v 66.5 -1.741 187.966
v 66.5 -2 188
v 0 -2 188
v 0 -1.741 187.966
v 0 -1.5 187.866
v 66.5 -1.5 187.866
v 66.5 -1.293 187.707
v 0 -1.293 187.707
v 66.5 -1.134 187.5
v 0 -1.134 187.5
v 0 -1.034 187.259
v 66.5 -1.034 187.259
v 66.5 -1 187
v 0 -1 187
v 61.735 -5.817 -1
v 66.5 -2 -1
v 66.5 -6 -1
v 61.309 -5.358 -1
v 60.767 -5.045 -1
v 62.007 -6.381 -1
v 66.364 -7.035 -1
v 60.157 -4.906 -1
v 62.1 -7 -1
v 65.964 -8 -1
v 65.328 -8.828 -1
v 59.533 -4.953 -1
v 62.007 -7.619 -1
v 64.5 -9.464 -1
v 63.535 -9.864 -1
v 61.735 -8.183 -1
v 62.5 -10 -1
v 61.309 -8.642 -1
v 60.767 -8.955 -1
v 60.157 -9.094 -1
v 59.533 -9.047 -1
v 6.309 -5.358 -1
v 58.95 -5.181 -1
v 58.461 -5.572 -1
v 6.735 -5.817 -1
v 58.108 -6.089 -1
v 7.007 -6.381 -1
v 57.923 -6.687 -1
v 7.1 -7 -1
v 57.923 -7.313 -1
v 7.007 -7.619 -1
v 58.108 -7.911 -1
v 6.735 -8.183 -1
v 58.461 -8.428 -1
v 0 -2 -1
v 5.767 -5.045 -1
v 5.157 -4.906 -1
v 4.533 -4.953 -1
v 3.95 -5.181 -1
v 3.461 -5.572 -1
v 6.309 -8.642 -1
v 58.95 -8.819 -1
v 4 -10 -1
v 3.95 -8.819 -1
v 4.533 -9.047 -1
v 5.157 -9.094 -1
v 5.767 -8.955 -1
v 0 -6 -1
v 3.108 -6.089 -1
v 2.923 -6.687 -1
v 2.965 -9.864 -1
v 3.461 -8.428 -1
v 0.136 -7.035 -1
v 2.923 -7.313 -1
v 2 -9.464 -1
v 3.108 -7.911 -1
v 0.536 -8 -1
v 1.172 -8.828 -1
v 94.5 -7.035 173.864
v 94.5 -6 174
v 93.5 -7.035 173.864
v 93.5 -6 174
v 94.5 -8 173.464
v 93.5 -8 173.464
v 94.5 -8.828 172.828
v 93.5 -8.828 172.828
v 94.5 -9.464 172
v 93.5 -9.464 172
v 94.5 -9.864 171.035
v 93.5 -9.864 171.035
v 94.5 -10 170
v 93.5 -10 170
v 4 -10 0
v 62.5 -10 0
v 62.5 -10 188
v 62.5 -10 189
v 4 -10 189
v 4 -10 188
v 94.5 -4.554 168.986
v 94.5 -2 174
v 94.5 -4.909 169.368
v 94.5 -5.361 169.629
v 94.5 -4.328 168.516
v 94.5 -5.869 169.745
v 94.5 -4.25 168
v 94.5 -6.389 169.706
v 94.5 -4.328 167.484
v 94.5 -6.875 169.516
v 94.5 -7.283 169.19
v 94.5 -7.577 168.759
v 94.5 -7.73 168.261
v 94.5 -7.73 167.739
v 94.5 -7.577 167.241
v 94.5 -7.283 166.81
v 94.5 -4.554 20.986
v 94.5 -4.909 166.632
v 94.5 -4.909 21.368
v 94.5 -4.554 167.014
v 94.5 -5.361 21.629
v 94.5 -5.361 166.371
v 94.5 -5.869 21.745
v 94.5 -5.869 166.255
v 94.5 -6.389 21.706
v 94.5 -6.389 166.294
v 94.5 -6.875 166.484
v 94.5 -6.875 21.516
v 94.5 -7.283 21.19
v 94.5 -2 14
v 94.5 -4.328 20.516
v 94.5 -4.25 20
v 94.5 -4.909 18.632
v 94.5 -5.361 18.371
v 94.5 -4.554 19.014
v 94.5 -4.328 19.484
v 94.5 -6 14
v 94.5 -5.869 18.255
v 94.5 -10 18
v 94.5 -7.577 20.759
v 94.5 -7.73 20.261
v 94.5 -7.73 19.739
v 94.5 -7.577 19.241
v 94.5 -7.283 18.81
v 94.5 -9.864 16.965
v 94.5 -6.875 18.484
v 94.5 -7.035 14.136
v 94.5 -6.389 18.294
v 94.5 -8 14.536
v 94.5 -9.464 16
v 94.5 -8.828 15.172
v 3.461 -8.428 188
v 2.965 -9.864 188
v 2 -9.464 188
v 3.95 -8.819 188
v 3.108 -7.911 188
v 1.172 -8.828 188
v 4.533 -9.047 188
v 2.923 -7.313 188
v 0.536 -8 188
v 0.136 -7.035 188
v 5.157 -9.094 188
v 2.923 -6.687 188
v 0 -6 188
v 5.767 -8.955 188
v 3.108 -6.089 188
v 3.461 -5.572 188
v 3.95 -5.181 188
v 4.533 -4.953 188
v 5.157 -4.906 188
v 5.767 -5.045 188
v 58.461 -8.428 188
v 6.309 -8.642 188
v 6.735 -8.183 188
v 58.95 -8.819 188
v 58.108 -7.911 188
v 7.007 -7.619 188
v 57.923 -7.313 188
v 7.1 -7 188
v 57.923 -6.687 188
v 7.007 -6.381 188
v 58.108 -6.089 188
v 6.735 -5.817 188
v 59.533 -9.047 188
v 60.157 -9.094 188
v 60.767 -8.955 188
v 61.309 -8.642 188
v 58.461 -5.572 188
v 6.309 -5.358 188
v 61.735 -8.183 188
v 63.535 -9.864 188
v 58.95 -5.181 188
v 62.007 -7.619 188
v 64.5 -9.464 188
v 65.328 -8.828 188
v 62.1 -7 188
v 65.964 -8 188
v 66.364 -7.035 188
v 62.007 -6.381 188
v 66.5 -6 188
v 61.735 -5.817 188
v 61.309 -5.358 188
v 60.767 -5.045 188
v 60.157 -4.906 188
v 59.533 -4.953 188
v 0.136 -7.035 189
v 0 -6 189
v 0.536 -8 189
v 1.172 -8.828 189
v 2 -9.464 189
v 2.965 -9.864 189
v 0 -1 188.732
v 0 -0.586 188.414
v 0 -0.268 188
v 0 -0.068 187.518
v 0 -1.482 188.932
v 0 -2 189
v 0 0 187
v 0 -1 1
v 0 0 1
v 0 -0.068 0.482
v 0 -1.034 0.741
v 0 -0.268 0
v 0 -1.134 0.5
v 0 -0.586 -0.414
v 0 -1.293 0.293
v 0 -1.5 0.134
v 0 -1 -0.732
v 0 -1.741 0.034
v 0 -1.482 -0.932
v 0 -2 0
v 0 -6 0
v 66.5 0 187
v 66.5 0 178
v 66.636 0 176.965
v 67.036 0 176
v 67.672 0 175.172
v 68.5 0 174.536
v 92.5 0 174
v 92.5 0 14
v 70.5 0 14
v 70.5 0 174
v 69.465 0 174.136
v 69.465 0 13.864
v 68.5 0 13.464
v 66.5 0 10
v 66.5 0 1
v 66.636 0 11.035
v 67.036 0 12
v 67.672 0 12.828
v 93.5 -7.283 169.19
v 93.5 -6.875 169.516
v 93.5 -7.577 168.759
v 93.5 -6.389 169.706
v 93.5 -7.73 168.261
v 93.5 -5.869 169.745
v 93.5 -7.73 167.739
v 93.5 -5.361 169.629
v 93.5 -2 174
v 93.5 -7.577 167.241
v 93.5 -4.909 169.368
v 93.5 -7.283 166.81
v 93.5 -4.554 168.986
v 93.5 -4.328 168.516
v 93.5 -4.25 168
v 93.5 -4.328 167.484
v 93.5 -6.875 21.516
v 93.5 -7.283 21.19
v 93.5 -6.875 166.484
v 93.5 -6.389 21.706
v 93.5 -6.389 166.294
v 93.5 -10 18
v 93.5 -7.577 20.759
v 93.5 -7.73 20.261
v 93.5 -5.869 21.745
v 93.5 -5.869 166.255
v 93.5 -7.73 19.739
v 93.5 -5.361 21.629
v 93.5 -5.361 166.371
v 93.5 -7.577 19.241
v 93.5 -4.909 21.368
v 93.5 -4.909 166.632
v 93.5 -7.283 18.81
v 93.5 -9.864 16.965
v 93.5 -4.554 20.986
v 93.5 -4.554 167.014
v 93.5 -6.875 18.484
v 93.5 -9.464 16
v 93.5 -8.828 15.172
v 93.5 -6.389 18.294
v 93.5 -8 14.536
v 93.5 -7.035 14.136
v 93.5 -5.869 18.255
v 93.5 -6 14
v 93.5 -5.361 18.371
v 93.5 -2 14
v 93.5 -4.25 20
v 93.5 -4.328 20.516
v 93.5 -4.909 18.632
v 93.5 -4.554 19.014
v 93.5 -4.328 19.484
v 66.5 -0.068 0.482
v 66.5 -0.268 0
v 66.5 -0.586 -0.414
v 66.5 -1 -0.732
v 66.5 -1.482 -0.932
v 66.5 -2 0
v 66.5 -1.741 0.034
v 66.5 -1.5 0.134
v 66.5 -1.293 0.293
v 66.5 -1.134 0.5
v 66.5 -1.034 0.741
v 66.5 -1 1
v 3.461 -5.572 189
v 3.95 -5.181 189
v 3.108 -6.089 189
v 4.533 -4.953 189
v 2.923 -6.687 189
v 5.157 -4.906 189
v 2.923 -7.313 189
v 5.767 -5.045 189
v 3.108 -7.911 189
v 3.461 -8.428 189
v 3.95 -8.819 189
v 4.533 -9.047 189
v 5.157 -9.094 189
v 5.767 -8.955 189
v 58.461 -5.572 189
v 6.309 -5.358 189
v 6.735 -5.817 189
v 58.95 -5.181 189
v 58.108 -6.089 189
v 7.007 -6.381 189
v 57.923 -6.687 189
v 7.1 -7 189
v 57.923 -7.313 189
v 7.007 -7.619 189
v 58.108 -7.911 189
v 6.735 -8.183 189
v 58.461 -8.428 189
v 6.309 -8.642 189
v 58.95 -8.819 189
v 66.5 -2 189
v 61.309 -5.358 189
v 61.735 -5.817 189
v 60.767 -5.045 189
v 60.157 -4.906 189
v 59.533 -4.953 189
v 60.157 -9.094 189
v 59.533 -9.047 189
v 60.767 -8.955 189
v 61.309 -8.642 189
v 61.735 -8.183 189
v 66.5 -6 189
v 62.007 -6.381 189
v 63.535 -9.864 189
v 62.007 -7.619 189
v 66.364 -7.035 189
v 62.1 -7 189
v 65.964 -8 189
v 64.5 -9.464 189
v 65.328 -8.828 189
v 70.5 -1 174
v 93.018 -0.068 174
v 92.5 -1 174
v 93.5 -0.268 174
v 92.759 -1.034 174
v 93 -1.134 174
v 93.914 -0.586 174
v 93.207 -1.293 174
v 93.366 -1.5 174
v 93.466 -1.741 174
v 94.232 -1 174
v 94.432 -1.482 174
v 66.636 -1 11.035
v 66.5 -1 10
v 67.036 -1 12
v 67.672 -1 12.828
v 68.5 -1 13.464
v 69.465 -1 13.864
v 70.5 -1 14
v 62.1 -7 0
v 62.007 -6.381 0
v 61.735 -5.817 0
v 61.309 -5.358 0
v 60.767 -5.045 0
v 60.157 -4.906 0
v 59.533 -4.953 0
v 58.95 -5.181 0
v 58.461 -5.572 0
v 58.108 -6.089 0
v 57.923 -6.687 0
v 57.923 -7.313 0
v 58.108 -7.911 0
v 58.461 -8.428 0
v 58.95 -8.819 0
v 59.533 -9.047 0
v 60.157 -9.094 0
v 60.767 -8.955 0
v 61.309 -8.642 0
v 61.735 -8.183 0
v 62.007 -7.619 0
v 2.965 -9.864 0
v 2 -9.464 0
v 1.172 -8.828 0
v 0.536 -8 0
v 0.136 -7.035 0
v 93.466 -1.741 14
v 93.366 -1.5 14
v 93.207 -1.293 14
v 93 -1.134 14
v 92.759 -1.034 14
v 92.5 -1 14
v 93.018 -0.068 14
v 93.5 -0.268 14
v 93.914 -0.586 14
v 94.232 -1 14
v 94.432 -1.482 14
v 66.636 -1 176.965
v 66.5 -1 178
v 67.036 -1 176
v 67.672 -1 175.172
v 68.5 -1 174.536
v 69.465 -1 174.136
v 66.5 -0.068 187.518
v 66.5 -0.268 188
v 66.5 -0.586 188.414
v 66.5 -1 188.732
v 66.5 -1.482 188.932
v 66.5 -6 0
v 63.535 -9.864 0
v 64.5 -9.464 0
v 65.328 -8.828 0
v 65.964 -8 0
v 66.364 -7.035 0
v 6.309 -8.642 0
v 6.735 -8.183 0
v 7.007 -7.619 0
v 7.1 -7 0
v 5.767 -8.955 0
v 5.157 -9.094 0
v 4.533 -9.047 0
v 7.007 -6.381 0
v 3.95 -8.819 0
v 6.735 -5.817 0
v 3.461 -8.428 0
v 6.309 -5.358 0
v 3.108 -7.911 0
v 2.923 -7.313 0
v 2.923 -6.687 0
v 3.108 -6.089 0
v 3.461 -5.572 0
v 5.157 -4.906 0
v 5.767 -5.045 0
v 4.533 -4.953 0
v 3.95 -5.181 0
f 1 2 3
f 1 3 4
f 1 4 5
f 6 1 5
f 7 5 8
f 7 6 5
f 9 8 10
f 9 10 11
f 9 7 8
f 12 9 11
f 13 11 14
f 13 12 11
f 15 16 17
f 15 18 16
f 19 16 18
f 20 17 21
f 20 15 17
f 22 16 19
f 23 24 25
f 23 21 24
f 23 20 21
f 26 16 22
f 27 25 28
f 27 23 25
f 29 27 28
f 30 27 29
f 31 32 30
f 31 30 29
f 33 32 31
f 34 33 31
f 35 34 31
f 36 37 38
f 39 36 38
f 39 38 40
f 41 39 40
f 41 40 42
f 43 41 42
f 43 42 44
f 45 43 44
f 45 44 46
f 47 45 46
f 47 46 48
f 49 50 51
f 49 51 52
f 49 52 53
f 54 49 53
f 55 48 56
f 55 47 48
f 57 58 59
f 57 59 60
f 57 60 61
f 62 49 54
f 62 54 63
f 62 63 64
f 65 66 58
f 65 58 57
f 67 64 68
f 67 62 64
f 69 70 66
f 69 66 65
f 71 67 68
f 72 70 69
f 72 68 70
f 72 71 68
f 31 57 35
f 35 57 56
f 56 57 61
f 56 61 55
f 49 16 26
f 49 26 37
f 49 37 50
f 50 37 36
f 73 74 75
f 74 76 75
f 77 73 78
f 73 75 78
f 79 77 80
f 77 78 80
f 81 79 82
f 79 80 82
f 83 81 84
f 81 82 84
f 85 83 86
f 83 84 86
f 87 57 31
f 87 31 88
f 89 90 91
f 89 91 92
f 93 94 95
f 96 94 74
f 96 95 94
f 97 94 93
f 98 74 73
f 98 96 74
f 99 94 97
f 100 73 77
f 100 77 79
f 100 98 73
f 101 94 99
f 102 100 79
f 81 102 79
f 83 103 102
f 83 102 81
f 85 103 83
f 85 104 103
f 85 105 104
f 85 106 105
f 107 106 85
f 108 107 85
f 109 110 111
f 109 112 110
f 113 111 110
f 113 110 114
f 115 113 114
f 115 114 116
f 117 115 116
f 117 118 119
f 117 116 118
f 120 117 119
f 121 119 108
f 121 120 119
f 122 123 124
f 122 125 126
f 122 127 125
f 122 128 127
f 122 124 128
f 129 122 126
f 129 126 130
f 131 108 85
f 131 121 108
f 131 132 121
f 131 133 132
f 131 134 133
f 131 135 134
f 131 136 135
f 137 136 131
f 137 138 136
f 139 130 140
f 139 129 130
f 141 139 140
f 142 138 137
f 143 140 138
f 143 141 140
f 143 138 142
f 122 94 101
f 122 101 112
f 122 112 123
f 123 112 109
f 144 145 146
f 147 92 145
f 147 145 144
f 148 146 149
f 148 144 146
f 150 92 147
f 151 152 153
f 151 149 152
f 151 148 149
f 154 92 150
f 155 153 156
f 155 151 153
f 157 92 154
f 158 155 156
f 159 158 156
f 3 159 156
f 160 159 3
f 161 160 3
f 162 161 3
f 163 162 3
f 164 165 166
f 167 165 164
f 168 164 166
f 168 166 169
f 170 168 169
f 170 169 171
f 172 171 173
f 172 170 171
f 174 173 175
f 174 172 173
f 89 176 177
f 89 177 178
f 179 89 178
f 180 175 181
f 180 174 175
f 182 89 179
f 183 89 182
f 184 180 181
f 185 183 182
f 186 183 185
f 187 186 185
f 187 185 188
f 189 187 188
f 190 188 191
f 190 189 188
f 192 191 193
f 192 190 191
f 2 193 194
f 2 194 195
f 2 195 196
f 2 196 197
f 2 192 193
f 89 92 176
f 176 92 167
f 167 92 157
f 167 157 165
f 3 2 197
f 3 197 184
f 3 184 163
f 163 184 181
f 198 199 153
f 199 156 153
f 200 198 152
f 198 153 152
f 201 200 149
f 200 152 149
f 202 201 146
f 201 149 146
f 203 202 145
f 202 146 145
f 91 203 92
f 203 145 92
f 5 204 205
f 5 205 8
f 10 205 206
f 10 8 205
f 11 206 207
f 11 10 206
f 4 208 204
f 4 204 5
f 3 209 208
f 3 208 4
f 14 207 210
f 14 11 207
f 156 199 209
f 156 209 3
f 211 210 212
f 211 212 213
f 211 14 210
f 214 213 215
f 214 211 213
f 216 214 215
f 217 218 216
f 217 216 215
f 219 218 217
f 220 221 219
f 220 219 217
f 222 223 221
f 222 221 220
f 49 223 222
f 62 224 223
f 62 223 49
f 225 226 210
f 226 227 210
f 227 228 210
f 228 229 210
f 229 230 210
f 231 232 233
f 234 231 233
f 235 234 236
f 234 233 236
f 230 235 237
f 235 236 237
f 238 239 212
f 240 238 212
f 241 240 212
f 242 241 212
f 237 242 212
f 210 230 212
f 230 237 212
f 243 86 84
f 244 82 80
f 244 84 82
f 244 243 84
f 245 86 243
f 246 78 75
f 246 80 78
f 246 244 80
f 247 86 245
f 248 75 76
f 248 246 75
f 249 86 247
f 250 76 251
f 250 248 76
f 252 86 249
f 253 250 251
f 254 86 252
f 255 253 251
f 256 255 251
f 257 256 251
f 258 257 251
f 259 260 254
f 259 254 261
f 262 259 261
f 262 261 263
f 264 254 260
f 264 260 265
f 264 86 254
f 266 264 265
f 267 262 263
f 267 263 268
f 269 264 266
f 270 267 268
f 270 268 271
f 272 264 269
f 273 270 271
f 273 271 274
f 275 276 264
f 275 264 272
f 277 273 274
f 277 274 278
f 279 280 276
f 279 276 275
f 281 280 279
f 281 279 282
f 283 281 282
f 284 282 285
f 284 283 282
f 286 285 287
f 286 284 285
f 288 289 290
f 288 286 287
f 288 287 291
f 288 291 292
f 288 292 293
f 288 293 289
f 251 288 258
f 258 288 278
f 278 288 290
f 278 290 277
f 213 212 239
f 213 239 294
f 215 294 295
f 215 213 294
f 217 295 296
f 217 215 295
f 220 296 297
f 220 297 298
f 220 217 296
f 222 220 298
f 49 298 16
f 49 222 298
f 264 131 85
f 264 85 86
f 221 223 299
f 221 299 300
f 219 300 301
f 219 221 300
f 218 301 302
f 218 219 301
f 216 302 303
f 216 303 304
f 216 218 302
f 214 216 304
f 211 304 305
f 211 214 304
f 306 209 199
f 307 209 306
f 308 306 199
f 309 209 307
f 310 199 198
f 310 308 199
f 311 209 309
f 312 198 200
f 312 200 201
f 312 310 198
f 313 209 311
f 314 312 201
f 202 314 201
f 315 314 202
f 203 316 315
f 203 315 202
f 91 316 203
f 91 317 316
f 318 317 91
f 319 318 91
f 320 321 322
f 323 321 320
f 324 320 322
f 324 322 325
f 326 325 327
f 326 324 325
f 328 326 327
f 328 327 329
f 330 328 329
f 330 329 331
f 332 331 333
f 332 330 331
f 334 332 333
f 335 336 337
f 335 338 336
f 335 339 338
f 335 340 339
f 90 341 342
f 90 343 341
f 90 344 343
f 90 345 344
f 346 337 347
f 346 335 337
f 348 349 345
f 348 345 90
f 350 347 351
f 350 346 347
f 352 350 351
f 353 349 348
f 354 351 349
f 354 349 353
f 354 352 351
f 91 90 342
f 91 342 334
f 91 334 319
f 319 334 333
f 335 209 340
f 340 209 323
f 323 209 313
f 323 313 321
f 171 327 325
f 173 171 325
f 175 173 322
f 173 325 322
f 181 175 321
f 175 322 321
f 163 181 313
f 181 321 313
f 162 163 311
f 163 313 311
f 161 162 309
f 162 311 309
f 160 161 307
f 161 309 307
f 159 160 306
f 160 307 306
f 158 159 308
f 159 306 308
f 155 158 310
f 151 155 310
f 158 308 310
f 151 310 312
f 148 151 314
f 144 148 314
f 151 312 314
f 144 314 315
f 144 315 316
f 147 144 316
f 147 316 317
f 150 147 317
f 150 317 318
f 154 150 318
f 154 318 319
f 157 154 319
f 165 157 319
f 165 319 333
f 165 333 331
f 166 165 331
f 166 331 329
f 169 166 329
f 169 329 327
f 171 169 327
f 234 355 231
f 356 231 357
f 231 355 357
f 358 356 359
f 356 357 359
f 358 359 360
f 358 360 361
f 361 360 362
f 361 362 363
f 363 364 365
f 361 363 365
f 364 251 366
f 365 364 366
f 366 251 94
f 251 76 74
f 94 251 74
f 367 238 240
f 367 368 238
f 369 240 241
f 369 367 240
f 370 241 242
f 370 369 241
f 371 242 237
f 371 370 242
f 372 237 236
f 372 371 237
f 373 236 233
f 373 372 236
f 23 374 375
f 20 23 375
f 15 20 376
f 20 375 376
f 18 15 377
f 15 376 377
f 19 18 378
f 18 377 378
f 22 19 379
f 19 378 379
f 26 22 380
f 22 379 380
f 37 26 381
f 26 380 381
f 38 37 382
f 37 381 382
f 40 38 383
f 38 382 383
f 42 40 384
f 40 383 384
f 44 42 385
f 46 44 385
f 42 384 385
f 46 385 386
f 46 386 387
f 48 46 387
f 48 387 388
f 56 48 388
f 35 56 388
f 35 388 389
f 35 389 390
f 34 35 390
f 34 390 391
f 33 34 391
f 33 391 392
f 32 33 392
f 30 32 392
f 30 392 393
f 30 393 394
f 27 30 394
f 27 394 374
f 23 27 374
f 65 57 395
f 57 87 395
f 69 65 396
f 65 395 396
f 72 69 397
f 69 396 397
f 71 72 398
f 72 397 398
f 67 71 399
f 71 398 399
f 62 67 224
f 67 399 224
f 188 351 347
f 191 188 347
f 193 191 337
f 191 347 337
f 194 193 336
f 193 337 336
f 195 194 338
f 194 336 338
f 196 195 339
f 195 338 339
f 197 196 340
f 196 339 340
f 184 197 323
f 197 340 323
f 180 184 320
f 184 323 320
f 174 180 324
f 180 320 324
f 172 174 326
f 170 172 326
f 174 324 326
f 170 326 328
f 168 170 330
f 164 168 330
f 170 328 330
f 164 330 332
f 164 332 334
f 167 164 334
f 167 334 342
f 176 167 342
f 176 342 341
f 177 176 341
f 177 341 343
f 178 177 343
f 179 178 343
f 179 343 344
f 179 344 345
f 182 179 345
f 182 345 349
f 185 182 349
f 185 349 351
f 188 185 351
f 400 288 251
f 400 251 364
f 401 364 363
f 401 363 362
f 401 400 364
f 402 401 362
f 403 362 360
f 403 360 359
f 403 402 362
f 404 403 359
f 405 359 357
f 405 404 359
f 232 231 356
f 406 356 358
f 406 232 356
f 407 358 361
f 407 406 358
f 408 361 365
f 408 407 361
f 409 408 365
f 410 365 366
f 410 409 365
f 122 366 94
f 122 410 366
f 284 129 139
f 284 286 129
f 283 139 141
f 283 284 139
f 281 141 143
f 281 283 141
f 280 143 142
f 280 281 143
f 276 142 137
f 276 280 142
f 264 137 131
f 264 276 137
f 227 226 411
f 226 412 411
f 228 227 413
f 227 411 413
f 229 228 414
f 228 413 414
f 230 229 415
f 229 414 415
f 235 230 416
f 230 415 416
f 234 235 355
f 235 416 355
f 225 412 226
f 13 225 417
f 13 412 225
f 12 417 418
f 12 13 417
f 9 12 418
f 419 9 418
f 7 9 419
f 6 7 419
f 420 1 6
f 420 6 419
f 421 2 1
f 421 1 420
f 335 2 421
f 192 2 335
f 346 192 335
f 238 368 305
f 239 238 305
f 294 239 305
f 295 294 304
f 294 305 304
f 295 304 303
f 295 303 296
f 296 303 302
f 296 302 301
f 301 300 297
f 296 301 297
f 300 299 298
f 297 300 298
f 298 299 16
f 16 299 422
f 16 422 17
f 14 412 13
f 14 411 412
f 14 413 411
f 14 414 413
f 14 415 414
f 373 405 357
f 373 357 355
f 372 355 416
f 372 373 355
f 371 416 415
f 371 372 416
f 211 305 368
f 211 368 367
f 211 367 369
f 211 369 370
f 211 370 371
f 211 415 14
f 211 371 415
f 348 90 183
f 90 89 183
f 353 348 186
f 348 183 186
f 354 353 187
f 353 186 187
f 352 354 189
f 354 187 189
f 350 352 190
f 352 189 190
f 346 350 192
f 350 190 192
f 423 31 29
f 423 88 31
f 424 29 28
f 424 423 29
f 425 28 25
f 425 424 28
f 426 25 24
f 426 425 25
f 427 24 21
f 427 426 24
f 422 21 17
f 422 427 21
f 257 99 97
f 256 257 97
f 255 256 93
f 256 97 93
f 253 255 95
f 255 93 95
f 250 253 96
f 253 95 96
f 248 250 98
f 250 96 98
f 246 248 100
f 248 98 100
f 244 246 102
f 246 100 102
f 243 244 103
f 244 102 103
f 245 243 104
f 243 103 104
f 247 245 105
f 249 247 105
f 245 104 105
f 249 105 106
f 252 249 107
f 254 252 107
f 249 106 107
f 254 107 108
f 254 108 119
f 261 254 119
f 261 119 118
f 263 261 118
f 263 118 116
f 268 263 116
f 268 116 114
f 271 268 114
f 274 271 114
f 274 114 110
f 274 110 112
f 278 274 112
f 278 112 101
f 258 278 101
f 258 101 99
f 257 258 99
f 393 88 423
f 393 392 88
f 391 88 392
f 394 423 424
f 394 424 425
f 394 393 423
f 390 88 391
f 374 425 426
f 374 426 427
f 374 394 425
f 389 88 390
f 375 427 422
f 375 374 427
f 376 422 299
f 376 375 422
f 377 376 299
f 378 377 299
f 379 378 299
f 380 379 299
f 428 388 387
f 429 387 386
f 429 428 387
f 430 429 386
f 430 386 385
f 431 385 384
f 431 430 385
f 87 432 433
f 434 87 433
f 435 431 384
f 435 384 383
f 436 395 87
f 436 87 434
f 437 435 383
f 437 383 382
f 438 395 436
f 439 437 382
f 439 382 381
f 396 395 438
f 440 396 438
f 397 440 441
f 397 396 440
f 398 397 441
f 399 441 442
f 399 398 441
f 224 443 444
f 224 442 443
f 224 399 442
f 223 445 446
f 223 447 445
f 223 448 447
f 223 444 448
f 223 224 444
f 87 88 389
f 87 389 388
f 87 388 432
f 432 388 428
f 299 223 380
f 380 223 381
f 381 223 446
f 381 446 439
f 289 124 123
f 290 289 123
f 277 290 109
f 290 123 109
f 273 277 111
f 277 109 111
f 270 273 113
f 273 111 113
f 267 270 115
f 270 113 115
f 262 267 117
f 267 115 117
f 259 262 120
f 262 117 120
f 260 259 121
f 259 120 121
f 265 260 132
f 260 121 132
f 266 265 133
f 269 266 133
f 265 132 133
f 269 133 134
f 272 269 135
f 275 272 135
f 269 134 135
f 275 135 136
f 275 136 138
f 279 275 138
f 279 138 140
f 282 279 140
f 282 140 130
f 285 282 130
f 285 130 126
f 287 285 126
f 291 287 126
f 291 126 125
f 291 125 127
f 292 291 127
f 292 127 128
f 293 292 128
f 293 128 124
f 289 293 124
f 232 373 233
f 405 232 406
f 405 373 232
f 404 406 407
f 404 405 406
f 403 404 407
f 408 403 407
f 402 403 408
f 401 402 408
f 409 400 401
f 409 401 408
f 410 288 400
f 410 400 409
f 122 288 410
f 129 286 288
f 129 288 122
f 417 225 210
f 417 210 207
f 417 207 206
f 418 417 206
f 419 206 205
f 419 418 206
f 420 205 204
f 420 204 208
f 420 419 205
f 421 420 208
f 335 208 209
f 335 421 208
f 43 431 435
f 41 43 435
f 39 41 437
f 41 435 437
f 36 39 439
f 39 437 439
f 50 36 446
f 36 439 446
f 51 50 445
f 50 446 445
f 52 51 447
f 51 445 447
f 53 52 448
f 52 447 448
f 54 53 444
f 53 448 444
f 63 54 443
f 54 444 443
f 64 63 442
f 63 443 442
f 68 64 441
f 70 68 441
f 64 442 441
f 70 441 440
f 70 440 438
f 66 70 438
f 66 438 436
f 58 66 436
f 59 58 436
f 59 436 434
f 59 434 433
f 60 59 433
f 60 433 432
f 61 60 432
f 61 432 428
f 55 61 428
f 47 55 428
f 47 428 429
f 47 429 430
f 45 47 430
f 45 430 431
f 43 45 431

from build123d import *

# Parameters (mm, degrees)
SM_BASE_FLANGE_1_DEPTH             = 1
SM_EDGE_FLANGE_1_STRIP_W           = 6
SM_EDGE_FLANGE_1_STRIP_H           = 1
SM_EDGE_FLANGE_1_STRIP_CUT_DEPTH   = 160
SM_EDGE_FLANGE_1_DEPTH             = 160
SM_EDGE_FLANGE_2_STRIP_W           = 6
SM_EDGE_FLANGE_2_STRIP_H           = 1
SM_EDGE_FLANGE_2_STRIP_CUT_DEPTH   = 66.5
SM_EDGE_FLANGE_2_STRIP_2_W         = 6
SM_EDGE_FLANGE_2_STRIP_2_H         = 1
SM_EDGE_FLANGE_2_STRIP_CUT_2_DEPTH = 66.5
SM_EDGE_FLANGE_2_DEPTH             = 66.5
SM_EDGE_FLANGE_2_BEND_DEPTH        = 66.5
SKETCH_15_R                        = 1.75
CUT_EXTRUDE_1_DEPTH                = 10
FILLET_1_R                         = 4
SKETCH_16_R                        = 2.1
CUT_EXTRUDE_2_DEPTH                = 213.438814721


# Sheet-metal steps are written as plain solids
with BuildPart() as part:
    # Sketch 1 → Базовая кромка1 (new body)
    with BuildSketch(Plane(origin=(0, 0, 0), x_dir=(1, 0, 0), z_dir=(0, 1, 0))):
        Polygon((0, 0), (66.5, 0), (66.5, -14), (94.5, -14), (94.5, -174), (66.5, -174), (66.5, -188), (0, -188), align=None)
    extrude(amount=-SM_BASE_FLANGE_1_DEPTH)

    # Ребро-кромка1 strip (across the edge) → Ребро-кромка1 strip cut (cut)
    with BuildSketch(Plane(origin=(94.5, -1, 14), x_dir=(-1, 0, 0), z_dir=(0, 0, 1))):
        with Locations((-1, -0.5)):
            Rectangle(SM_EDGE_FLANGE_1_STRIP_W, SM_EDGE_FLANGE_1_STRIP_H)
    extrude(amount=SM_EDGE_FLANGE_1_STRIP_CUT_DEPTH, mode=Mode.SUBTRACT)

    # Ребро-кромка1 section (across the edge) → Ребро-кромка1 (add)
    with BuildSketch(Plane(origin=(94.5, -1, 14), x_dir=(-1, 0, 0), z_dir=(0, 0, 1))):
        with BuildLine():
            Line((0, 1), (0, 9))
            Line((0, 9), (1, 9))
            Line((1, 9), (1, 1))
            ThreePointArc((1, 1), (1.292893219, 0.292893219), (2, 0))
            Line((2, 0), (2, -1))
            ThreePointArc((2, -1), (0.585786438, -0.414213562), (0, 1))
        make_face()
    extrude(amount=SM_EDGE_FLANGE_1_DEPTH)

    # Ребро-кромка2 strip (across the edge) → Ребро-кромка2 strip cut (cut)
    with BuildSketch(Plane(origin=(66.5, -1, 188), x_dir=(0, 0, -1), z_dir=(-1, 0, 0))):
        with Locations((-2, -0.5)):
            Rectangle(SM_EDGE_FLANGE_2_STRIP_W, SM_EDGE_FLANGE_2_STRIP_H)
    extrude(amount=SM_EDGE_FLANGE_2_STRIP_CUT_DEPTH, mode=Mode.SUBTRACT)

    # Ребро-кромка2 strip 2 (across the edge) → Ребро-кромка2 strip cut 2 (cut)
    with BuildSketch(Plane(origin=(0, -1, 0), x_dir=(0, 0, 1), z_dir=(1, 0, 0))):
        with Locations((-2, -0.5)):
            Rectangle(SM_EDGE_FLANGE_2_STRIP_2_W, SM_EDGE_FLANGE_2_STRIP_2_H)
    extrude(amount=SM_EDGE_FLANGE_2_STRIP_CUT_2_DEPTH, mode=Mode.SUBTRACT)

    # Ребро-кромка2 section (across the edge) → Ребро-кромка2 (add)
    with BuildSketch(Plane(origin=(66.5, -1, 188), x_dir=(0, 0, -1), z_dir=(-1, 0, 0))):
        with BuildLine():
            Line((-1, 1), (-1, 9))
            Line((-1, 9), (0, 9))
            Line((0, 9), (0, 1))
            ThreePointArc((0, 1), (0.292893219, 0.292893219), (1, 0))
            Line((1, 0), (1, -1))
            ThreePointArc((1, -1), (-0.414213562, -0.414213562), (-1, 1))
        make_face()
    extrude(amount=SM_EDGE_FLANGE_2_DEPTH)

    # Ребро-кромка2 section 2 (across the edge) → Ребро-кромка2 bend (add)
    with BuildSketch(Plane(origin=(0, -1, 0), x_dir=(0, 0, 1), z_dir=(1, 0, 0))):
        with BuildLine():
            Line((-1, 1), (-1, 9))
            Line((-1, 9), (0, 9))
            Line((0, 9), (0, 1))
            ThreePointArc((0, 1), (0.292893219, 0.292893219), (1, 0))
            Line((1, 0), (1, -1))
            ThreePointArc((1, -1), (-0.414213562, -0.414213562), (-1, 1))
        make_face()
    extrude(amount=SM_EDGE_FLANGE_2_BEND_DEPTH)

    # Эскиз15 → Вырез-Вытянуть1 (cut)
    with BuildSketch(Plane(origin=(94.5, 0, 0), x_dir=(0, 0, -1), z_dir=(1, 0, 0))):
        with Locations(Location((-168, -6, 0), (0, 0, 90))):
            Circle(SKETCH_15_R)
        with Locations(Location((-20, -6, 0), (0, 0, 90))):
            Circle(SKETCH_15_R)
    extrude(amount=-CUT_EXTRUDE_1_DEPTH, mode=Mode.SUBTRACT)

    # Скругление1
    fillet_1_edges = [part.edges().sort_by_distance(p)[0] for p in [
        (0, -10, -0.5),
        (66.5, -10, -0.5),
        (66.5, -0.5, 14),
        (66.5, -0.5, 174),
        (94, -10, 14),
        (94, -10, 174),
        (66.5, -10, 188.5),
        (0, -10, 188.5),
    ]]
    fillet(fillet_1_edges, radius=FILLET_1_R)

    # Эскиз16 → Вырез-Вытянуть2 (cut, through all)
    with BuildSketch(Plane.XY.offset(189)):
        with Locations((5, -7)):
            Circle(SKETCH_16_R)
        with Locations((60, -7)):
            Circle(SKETCH_16_R)
    extrude(amount=-CUT_EXTRUDE_2_DEPTH, mode=Mode.SUBTRACT)


solid = part.part
